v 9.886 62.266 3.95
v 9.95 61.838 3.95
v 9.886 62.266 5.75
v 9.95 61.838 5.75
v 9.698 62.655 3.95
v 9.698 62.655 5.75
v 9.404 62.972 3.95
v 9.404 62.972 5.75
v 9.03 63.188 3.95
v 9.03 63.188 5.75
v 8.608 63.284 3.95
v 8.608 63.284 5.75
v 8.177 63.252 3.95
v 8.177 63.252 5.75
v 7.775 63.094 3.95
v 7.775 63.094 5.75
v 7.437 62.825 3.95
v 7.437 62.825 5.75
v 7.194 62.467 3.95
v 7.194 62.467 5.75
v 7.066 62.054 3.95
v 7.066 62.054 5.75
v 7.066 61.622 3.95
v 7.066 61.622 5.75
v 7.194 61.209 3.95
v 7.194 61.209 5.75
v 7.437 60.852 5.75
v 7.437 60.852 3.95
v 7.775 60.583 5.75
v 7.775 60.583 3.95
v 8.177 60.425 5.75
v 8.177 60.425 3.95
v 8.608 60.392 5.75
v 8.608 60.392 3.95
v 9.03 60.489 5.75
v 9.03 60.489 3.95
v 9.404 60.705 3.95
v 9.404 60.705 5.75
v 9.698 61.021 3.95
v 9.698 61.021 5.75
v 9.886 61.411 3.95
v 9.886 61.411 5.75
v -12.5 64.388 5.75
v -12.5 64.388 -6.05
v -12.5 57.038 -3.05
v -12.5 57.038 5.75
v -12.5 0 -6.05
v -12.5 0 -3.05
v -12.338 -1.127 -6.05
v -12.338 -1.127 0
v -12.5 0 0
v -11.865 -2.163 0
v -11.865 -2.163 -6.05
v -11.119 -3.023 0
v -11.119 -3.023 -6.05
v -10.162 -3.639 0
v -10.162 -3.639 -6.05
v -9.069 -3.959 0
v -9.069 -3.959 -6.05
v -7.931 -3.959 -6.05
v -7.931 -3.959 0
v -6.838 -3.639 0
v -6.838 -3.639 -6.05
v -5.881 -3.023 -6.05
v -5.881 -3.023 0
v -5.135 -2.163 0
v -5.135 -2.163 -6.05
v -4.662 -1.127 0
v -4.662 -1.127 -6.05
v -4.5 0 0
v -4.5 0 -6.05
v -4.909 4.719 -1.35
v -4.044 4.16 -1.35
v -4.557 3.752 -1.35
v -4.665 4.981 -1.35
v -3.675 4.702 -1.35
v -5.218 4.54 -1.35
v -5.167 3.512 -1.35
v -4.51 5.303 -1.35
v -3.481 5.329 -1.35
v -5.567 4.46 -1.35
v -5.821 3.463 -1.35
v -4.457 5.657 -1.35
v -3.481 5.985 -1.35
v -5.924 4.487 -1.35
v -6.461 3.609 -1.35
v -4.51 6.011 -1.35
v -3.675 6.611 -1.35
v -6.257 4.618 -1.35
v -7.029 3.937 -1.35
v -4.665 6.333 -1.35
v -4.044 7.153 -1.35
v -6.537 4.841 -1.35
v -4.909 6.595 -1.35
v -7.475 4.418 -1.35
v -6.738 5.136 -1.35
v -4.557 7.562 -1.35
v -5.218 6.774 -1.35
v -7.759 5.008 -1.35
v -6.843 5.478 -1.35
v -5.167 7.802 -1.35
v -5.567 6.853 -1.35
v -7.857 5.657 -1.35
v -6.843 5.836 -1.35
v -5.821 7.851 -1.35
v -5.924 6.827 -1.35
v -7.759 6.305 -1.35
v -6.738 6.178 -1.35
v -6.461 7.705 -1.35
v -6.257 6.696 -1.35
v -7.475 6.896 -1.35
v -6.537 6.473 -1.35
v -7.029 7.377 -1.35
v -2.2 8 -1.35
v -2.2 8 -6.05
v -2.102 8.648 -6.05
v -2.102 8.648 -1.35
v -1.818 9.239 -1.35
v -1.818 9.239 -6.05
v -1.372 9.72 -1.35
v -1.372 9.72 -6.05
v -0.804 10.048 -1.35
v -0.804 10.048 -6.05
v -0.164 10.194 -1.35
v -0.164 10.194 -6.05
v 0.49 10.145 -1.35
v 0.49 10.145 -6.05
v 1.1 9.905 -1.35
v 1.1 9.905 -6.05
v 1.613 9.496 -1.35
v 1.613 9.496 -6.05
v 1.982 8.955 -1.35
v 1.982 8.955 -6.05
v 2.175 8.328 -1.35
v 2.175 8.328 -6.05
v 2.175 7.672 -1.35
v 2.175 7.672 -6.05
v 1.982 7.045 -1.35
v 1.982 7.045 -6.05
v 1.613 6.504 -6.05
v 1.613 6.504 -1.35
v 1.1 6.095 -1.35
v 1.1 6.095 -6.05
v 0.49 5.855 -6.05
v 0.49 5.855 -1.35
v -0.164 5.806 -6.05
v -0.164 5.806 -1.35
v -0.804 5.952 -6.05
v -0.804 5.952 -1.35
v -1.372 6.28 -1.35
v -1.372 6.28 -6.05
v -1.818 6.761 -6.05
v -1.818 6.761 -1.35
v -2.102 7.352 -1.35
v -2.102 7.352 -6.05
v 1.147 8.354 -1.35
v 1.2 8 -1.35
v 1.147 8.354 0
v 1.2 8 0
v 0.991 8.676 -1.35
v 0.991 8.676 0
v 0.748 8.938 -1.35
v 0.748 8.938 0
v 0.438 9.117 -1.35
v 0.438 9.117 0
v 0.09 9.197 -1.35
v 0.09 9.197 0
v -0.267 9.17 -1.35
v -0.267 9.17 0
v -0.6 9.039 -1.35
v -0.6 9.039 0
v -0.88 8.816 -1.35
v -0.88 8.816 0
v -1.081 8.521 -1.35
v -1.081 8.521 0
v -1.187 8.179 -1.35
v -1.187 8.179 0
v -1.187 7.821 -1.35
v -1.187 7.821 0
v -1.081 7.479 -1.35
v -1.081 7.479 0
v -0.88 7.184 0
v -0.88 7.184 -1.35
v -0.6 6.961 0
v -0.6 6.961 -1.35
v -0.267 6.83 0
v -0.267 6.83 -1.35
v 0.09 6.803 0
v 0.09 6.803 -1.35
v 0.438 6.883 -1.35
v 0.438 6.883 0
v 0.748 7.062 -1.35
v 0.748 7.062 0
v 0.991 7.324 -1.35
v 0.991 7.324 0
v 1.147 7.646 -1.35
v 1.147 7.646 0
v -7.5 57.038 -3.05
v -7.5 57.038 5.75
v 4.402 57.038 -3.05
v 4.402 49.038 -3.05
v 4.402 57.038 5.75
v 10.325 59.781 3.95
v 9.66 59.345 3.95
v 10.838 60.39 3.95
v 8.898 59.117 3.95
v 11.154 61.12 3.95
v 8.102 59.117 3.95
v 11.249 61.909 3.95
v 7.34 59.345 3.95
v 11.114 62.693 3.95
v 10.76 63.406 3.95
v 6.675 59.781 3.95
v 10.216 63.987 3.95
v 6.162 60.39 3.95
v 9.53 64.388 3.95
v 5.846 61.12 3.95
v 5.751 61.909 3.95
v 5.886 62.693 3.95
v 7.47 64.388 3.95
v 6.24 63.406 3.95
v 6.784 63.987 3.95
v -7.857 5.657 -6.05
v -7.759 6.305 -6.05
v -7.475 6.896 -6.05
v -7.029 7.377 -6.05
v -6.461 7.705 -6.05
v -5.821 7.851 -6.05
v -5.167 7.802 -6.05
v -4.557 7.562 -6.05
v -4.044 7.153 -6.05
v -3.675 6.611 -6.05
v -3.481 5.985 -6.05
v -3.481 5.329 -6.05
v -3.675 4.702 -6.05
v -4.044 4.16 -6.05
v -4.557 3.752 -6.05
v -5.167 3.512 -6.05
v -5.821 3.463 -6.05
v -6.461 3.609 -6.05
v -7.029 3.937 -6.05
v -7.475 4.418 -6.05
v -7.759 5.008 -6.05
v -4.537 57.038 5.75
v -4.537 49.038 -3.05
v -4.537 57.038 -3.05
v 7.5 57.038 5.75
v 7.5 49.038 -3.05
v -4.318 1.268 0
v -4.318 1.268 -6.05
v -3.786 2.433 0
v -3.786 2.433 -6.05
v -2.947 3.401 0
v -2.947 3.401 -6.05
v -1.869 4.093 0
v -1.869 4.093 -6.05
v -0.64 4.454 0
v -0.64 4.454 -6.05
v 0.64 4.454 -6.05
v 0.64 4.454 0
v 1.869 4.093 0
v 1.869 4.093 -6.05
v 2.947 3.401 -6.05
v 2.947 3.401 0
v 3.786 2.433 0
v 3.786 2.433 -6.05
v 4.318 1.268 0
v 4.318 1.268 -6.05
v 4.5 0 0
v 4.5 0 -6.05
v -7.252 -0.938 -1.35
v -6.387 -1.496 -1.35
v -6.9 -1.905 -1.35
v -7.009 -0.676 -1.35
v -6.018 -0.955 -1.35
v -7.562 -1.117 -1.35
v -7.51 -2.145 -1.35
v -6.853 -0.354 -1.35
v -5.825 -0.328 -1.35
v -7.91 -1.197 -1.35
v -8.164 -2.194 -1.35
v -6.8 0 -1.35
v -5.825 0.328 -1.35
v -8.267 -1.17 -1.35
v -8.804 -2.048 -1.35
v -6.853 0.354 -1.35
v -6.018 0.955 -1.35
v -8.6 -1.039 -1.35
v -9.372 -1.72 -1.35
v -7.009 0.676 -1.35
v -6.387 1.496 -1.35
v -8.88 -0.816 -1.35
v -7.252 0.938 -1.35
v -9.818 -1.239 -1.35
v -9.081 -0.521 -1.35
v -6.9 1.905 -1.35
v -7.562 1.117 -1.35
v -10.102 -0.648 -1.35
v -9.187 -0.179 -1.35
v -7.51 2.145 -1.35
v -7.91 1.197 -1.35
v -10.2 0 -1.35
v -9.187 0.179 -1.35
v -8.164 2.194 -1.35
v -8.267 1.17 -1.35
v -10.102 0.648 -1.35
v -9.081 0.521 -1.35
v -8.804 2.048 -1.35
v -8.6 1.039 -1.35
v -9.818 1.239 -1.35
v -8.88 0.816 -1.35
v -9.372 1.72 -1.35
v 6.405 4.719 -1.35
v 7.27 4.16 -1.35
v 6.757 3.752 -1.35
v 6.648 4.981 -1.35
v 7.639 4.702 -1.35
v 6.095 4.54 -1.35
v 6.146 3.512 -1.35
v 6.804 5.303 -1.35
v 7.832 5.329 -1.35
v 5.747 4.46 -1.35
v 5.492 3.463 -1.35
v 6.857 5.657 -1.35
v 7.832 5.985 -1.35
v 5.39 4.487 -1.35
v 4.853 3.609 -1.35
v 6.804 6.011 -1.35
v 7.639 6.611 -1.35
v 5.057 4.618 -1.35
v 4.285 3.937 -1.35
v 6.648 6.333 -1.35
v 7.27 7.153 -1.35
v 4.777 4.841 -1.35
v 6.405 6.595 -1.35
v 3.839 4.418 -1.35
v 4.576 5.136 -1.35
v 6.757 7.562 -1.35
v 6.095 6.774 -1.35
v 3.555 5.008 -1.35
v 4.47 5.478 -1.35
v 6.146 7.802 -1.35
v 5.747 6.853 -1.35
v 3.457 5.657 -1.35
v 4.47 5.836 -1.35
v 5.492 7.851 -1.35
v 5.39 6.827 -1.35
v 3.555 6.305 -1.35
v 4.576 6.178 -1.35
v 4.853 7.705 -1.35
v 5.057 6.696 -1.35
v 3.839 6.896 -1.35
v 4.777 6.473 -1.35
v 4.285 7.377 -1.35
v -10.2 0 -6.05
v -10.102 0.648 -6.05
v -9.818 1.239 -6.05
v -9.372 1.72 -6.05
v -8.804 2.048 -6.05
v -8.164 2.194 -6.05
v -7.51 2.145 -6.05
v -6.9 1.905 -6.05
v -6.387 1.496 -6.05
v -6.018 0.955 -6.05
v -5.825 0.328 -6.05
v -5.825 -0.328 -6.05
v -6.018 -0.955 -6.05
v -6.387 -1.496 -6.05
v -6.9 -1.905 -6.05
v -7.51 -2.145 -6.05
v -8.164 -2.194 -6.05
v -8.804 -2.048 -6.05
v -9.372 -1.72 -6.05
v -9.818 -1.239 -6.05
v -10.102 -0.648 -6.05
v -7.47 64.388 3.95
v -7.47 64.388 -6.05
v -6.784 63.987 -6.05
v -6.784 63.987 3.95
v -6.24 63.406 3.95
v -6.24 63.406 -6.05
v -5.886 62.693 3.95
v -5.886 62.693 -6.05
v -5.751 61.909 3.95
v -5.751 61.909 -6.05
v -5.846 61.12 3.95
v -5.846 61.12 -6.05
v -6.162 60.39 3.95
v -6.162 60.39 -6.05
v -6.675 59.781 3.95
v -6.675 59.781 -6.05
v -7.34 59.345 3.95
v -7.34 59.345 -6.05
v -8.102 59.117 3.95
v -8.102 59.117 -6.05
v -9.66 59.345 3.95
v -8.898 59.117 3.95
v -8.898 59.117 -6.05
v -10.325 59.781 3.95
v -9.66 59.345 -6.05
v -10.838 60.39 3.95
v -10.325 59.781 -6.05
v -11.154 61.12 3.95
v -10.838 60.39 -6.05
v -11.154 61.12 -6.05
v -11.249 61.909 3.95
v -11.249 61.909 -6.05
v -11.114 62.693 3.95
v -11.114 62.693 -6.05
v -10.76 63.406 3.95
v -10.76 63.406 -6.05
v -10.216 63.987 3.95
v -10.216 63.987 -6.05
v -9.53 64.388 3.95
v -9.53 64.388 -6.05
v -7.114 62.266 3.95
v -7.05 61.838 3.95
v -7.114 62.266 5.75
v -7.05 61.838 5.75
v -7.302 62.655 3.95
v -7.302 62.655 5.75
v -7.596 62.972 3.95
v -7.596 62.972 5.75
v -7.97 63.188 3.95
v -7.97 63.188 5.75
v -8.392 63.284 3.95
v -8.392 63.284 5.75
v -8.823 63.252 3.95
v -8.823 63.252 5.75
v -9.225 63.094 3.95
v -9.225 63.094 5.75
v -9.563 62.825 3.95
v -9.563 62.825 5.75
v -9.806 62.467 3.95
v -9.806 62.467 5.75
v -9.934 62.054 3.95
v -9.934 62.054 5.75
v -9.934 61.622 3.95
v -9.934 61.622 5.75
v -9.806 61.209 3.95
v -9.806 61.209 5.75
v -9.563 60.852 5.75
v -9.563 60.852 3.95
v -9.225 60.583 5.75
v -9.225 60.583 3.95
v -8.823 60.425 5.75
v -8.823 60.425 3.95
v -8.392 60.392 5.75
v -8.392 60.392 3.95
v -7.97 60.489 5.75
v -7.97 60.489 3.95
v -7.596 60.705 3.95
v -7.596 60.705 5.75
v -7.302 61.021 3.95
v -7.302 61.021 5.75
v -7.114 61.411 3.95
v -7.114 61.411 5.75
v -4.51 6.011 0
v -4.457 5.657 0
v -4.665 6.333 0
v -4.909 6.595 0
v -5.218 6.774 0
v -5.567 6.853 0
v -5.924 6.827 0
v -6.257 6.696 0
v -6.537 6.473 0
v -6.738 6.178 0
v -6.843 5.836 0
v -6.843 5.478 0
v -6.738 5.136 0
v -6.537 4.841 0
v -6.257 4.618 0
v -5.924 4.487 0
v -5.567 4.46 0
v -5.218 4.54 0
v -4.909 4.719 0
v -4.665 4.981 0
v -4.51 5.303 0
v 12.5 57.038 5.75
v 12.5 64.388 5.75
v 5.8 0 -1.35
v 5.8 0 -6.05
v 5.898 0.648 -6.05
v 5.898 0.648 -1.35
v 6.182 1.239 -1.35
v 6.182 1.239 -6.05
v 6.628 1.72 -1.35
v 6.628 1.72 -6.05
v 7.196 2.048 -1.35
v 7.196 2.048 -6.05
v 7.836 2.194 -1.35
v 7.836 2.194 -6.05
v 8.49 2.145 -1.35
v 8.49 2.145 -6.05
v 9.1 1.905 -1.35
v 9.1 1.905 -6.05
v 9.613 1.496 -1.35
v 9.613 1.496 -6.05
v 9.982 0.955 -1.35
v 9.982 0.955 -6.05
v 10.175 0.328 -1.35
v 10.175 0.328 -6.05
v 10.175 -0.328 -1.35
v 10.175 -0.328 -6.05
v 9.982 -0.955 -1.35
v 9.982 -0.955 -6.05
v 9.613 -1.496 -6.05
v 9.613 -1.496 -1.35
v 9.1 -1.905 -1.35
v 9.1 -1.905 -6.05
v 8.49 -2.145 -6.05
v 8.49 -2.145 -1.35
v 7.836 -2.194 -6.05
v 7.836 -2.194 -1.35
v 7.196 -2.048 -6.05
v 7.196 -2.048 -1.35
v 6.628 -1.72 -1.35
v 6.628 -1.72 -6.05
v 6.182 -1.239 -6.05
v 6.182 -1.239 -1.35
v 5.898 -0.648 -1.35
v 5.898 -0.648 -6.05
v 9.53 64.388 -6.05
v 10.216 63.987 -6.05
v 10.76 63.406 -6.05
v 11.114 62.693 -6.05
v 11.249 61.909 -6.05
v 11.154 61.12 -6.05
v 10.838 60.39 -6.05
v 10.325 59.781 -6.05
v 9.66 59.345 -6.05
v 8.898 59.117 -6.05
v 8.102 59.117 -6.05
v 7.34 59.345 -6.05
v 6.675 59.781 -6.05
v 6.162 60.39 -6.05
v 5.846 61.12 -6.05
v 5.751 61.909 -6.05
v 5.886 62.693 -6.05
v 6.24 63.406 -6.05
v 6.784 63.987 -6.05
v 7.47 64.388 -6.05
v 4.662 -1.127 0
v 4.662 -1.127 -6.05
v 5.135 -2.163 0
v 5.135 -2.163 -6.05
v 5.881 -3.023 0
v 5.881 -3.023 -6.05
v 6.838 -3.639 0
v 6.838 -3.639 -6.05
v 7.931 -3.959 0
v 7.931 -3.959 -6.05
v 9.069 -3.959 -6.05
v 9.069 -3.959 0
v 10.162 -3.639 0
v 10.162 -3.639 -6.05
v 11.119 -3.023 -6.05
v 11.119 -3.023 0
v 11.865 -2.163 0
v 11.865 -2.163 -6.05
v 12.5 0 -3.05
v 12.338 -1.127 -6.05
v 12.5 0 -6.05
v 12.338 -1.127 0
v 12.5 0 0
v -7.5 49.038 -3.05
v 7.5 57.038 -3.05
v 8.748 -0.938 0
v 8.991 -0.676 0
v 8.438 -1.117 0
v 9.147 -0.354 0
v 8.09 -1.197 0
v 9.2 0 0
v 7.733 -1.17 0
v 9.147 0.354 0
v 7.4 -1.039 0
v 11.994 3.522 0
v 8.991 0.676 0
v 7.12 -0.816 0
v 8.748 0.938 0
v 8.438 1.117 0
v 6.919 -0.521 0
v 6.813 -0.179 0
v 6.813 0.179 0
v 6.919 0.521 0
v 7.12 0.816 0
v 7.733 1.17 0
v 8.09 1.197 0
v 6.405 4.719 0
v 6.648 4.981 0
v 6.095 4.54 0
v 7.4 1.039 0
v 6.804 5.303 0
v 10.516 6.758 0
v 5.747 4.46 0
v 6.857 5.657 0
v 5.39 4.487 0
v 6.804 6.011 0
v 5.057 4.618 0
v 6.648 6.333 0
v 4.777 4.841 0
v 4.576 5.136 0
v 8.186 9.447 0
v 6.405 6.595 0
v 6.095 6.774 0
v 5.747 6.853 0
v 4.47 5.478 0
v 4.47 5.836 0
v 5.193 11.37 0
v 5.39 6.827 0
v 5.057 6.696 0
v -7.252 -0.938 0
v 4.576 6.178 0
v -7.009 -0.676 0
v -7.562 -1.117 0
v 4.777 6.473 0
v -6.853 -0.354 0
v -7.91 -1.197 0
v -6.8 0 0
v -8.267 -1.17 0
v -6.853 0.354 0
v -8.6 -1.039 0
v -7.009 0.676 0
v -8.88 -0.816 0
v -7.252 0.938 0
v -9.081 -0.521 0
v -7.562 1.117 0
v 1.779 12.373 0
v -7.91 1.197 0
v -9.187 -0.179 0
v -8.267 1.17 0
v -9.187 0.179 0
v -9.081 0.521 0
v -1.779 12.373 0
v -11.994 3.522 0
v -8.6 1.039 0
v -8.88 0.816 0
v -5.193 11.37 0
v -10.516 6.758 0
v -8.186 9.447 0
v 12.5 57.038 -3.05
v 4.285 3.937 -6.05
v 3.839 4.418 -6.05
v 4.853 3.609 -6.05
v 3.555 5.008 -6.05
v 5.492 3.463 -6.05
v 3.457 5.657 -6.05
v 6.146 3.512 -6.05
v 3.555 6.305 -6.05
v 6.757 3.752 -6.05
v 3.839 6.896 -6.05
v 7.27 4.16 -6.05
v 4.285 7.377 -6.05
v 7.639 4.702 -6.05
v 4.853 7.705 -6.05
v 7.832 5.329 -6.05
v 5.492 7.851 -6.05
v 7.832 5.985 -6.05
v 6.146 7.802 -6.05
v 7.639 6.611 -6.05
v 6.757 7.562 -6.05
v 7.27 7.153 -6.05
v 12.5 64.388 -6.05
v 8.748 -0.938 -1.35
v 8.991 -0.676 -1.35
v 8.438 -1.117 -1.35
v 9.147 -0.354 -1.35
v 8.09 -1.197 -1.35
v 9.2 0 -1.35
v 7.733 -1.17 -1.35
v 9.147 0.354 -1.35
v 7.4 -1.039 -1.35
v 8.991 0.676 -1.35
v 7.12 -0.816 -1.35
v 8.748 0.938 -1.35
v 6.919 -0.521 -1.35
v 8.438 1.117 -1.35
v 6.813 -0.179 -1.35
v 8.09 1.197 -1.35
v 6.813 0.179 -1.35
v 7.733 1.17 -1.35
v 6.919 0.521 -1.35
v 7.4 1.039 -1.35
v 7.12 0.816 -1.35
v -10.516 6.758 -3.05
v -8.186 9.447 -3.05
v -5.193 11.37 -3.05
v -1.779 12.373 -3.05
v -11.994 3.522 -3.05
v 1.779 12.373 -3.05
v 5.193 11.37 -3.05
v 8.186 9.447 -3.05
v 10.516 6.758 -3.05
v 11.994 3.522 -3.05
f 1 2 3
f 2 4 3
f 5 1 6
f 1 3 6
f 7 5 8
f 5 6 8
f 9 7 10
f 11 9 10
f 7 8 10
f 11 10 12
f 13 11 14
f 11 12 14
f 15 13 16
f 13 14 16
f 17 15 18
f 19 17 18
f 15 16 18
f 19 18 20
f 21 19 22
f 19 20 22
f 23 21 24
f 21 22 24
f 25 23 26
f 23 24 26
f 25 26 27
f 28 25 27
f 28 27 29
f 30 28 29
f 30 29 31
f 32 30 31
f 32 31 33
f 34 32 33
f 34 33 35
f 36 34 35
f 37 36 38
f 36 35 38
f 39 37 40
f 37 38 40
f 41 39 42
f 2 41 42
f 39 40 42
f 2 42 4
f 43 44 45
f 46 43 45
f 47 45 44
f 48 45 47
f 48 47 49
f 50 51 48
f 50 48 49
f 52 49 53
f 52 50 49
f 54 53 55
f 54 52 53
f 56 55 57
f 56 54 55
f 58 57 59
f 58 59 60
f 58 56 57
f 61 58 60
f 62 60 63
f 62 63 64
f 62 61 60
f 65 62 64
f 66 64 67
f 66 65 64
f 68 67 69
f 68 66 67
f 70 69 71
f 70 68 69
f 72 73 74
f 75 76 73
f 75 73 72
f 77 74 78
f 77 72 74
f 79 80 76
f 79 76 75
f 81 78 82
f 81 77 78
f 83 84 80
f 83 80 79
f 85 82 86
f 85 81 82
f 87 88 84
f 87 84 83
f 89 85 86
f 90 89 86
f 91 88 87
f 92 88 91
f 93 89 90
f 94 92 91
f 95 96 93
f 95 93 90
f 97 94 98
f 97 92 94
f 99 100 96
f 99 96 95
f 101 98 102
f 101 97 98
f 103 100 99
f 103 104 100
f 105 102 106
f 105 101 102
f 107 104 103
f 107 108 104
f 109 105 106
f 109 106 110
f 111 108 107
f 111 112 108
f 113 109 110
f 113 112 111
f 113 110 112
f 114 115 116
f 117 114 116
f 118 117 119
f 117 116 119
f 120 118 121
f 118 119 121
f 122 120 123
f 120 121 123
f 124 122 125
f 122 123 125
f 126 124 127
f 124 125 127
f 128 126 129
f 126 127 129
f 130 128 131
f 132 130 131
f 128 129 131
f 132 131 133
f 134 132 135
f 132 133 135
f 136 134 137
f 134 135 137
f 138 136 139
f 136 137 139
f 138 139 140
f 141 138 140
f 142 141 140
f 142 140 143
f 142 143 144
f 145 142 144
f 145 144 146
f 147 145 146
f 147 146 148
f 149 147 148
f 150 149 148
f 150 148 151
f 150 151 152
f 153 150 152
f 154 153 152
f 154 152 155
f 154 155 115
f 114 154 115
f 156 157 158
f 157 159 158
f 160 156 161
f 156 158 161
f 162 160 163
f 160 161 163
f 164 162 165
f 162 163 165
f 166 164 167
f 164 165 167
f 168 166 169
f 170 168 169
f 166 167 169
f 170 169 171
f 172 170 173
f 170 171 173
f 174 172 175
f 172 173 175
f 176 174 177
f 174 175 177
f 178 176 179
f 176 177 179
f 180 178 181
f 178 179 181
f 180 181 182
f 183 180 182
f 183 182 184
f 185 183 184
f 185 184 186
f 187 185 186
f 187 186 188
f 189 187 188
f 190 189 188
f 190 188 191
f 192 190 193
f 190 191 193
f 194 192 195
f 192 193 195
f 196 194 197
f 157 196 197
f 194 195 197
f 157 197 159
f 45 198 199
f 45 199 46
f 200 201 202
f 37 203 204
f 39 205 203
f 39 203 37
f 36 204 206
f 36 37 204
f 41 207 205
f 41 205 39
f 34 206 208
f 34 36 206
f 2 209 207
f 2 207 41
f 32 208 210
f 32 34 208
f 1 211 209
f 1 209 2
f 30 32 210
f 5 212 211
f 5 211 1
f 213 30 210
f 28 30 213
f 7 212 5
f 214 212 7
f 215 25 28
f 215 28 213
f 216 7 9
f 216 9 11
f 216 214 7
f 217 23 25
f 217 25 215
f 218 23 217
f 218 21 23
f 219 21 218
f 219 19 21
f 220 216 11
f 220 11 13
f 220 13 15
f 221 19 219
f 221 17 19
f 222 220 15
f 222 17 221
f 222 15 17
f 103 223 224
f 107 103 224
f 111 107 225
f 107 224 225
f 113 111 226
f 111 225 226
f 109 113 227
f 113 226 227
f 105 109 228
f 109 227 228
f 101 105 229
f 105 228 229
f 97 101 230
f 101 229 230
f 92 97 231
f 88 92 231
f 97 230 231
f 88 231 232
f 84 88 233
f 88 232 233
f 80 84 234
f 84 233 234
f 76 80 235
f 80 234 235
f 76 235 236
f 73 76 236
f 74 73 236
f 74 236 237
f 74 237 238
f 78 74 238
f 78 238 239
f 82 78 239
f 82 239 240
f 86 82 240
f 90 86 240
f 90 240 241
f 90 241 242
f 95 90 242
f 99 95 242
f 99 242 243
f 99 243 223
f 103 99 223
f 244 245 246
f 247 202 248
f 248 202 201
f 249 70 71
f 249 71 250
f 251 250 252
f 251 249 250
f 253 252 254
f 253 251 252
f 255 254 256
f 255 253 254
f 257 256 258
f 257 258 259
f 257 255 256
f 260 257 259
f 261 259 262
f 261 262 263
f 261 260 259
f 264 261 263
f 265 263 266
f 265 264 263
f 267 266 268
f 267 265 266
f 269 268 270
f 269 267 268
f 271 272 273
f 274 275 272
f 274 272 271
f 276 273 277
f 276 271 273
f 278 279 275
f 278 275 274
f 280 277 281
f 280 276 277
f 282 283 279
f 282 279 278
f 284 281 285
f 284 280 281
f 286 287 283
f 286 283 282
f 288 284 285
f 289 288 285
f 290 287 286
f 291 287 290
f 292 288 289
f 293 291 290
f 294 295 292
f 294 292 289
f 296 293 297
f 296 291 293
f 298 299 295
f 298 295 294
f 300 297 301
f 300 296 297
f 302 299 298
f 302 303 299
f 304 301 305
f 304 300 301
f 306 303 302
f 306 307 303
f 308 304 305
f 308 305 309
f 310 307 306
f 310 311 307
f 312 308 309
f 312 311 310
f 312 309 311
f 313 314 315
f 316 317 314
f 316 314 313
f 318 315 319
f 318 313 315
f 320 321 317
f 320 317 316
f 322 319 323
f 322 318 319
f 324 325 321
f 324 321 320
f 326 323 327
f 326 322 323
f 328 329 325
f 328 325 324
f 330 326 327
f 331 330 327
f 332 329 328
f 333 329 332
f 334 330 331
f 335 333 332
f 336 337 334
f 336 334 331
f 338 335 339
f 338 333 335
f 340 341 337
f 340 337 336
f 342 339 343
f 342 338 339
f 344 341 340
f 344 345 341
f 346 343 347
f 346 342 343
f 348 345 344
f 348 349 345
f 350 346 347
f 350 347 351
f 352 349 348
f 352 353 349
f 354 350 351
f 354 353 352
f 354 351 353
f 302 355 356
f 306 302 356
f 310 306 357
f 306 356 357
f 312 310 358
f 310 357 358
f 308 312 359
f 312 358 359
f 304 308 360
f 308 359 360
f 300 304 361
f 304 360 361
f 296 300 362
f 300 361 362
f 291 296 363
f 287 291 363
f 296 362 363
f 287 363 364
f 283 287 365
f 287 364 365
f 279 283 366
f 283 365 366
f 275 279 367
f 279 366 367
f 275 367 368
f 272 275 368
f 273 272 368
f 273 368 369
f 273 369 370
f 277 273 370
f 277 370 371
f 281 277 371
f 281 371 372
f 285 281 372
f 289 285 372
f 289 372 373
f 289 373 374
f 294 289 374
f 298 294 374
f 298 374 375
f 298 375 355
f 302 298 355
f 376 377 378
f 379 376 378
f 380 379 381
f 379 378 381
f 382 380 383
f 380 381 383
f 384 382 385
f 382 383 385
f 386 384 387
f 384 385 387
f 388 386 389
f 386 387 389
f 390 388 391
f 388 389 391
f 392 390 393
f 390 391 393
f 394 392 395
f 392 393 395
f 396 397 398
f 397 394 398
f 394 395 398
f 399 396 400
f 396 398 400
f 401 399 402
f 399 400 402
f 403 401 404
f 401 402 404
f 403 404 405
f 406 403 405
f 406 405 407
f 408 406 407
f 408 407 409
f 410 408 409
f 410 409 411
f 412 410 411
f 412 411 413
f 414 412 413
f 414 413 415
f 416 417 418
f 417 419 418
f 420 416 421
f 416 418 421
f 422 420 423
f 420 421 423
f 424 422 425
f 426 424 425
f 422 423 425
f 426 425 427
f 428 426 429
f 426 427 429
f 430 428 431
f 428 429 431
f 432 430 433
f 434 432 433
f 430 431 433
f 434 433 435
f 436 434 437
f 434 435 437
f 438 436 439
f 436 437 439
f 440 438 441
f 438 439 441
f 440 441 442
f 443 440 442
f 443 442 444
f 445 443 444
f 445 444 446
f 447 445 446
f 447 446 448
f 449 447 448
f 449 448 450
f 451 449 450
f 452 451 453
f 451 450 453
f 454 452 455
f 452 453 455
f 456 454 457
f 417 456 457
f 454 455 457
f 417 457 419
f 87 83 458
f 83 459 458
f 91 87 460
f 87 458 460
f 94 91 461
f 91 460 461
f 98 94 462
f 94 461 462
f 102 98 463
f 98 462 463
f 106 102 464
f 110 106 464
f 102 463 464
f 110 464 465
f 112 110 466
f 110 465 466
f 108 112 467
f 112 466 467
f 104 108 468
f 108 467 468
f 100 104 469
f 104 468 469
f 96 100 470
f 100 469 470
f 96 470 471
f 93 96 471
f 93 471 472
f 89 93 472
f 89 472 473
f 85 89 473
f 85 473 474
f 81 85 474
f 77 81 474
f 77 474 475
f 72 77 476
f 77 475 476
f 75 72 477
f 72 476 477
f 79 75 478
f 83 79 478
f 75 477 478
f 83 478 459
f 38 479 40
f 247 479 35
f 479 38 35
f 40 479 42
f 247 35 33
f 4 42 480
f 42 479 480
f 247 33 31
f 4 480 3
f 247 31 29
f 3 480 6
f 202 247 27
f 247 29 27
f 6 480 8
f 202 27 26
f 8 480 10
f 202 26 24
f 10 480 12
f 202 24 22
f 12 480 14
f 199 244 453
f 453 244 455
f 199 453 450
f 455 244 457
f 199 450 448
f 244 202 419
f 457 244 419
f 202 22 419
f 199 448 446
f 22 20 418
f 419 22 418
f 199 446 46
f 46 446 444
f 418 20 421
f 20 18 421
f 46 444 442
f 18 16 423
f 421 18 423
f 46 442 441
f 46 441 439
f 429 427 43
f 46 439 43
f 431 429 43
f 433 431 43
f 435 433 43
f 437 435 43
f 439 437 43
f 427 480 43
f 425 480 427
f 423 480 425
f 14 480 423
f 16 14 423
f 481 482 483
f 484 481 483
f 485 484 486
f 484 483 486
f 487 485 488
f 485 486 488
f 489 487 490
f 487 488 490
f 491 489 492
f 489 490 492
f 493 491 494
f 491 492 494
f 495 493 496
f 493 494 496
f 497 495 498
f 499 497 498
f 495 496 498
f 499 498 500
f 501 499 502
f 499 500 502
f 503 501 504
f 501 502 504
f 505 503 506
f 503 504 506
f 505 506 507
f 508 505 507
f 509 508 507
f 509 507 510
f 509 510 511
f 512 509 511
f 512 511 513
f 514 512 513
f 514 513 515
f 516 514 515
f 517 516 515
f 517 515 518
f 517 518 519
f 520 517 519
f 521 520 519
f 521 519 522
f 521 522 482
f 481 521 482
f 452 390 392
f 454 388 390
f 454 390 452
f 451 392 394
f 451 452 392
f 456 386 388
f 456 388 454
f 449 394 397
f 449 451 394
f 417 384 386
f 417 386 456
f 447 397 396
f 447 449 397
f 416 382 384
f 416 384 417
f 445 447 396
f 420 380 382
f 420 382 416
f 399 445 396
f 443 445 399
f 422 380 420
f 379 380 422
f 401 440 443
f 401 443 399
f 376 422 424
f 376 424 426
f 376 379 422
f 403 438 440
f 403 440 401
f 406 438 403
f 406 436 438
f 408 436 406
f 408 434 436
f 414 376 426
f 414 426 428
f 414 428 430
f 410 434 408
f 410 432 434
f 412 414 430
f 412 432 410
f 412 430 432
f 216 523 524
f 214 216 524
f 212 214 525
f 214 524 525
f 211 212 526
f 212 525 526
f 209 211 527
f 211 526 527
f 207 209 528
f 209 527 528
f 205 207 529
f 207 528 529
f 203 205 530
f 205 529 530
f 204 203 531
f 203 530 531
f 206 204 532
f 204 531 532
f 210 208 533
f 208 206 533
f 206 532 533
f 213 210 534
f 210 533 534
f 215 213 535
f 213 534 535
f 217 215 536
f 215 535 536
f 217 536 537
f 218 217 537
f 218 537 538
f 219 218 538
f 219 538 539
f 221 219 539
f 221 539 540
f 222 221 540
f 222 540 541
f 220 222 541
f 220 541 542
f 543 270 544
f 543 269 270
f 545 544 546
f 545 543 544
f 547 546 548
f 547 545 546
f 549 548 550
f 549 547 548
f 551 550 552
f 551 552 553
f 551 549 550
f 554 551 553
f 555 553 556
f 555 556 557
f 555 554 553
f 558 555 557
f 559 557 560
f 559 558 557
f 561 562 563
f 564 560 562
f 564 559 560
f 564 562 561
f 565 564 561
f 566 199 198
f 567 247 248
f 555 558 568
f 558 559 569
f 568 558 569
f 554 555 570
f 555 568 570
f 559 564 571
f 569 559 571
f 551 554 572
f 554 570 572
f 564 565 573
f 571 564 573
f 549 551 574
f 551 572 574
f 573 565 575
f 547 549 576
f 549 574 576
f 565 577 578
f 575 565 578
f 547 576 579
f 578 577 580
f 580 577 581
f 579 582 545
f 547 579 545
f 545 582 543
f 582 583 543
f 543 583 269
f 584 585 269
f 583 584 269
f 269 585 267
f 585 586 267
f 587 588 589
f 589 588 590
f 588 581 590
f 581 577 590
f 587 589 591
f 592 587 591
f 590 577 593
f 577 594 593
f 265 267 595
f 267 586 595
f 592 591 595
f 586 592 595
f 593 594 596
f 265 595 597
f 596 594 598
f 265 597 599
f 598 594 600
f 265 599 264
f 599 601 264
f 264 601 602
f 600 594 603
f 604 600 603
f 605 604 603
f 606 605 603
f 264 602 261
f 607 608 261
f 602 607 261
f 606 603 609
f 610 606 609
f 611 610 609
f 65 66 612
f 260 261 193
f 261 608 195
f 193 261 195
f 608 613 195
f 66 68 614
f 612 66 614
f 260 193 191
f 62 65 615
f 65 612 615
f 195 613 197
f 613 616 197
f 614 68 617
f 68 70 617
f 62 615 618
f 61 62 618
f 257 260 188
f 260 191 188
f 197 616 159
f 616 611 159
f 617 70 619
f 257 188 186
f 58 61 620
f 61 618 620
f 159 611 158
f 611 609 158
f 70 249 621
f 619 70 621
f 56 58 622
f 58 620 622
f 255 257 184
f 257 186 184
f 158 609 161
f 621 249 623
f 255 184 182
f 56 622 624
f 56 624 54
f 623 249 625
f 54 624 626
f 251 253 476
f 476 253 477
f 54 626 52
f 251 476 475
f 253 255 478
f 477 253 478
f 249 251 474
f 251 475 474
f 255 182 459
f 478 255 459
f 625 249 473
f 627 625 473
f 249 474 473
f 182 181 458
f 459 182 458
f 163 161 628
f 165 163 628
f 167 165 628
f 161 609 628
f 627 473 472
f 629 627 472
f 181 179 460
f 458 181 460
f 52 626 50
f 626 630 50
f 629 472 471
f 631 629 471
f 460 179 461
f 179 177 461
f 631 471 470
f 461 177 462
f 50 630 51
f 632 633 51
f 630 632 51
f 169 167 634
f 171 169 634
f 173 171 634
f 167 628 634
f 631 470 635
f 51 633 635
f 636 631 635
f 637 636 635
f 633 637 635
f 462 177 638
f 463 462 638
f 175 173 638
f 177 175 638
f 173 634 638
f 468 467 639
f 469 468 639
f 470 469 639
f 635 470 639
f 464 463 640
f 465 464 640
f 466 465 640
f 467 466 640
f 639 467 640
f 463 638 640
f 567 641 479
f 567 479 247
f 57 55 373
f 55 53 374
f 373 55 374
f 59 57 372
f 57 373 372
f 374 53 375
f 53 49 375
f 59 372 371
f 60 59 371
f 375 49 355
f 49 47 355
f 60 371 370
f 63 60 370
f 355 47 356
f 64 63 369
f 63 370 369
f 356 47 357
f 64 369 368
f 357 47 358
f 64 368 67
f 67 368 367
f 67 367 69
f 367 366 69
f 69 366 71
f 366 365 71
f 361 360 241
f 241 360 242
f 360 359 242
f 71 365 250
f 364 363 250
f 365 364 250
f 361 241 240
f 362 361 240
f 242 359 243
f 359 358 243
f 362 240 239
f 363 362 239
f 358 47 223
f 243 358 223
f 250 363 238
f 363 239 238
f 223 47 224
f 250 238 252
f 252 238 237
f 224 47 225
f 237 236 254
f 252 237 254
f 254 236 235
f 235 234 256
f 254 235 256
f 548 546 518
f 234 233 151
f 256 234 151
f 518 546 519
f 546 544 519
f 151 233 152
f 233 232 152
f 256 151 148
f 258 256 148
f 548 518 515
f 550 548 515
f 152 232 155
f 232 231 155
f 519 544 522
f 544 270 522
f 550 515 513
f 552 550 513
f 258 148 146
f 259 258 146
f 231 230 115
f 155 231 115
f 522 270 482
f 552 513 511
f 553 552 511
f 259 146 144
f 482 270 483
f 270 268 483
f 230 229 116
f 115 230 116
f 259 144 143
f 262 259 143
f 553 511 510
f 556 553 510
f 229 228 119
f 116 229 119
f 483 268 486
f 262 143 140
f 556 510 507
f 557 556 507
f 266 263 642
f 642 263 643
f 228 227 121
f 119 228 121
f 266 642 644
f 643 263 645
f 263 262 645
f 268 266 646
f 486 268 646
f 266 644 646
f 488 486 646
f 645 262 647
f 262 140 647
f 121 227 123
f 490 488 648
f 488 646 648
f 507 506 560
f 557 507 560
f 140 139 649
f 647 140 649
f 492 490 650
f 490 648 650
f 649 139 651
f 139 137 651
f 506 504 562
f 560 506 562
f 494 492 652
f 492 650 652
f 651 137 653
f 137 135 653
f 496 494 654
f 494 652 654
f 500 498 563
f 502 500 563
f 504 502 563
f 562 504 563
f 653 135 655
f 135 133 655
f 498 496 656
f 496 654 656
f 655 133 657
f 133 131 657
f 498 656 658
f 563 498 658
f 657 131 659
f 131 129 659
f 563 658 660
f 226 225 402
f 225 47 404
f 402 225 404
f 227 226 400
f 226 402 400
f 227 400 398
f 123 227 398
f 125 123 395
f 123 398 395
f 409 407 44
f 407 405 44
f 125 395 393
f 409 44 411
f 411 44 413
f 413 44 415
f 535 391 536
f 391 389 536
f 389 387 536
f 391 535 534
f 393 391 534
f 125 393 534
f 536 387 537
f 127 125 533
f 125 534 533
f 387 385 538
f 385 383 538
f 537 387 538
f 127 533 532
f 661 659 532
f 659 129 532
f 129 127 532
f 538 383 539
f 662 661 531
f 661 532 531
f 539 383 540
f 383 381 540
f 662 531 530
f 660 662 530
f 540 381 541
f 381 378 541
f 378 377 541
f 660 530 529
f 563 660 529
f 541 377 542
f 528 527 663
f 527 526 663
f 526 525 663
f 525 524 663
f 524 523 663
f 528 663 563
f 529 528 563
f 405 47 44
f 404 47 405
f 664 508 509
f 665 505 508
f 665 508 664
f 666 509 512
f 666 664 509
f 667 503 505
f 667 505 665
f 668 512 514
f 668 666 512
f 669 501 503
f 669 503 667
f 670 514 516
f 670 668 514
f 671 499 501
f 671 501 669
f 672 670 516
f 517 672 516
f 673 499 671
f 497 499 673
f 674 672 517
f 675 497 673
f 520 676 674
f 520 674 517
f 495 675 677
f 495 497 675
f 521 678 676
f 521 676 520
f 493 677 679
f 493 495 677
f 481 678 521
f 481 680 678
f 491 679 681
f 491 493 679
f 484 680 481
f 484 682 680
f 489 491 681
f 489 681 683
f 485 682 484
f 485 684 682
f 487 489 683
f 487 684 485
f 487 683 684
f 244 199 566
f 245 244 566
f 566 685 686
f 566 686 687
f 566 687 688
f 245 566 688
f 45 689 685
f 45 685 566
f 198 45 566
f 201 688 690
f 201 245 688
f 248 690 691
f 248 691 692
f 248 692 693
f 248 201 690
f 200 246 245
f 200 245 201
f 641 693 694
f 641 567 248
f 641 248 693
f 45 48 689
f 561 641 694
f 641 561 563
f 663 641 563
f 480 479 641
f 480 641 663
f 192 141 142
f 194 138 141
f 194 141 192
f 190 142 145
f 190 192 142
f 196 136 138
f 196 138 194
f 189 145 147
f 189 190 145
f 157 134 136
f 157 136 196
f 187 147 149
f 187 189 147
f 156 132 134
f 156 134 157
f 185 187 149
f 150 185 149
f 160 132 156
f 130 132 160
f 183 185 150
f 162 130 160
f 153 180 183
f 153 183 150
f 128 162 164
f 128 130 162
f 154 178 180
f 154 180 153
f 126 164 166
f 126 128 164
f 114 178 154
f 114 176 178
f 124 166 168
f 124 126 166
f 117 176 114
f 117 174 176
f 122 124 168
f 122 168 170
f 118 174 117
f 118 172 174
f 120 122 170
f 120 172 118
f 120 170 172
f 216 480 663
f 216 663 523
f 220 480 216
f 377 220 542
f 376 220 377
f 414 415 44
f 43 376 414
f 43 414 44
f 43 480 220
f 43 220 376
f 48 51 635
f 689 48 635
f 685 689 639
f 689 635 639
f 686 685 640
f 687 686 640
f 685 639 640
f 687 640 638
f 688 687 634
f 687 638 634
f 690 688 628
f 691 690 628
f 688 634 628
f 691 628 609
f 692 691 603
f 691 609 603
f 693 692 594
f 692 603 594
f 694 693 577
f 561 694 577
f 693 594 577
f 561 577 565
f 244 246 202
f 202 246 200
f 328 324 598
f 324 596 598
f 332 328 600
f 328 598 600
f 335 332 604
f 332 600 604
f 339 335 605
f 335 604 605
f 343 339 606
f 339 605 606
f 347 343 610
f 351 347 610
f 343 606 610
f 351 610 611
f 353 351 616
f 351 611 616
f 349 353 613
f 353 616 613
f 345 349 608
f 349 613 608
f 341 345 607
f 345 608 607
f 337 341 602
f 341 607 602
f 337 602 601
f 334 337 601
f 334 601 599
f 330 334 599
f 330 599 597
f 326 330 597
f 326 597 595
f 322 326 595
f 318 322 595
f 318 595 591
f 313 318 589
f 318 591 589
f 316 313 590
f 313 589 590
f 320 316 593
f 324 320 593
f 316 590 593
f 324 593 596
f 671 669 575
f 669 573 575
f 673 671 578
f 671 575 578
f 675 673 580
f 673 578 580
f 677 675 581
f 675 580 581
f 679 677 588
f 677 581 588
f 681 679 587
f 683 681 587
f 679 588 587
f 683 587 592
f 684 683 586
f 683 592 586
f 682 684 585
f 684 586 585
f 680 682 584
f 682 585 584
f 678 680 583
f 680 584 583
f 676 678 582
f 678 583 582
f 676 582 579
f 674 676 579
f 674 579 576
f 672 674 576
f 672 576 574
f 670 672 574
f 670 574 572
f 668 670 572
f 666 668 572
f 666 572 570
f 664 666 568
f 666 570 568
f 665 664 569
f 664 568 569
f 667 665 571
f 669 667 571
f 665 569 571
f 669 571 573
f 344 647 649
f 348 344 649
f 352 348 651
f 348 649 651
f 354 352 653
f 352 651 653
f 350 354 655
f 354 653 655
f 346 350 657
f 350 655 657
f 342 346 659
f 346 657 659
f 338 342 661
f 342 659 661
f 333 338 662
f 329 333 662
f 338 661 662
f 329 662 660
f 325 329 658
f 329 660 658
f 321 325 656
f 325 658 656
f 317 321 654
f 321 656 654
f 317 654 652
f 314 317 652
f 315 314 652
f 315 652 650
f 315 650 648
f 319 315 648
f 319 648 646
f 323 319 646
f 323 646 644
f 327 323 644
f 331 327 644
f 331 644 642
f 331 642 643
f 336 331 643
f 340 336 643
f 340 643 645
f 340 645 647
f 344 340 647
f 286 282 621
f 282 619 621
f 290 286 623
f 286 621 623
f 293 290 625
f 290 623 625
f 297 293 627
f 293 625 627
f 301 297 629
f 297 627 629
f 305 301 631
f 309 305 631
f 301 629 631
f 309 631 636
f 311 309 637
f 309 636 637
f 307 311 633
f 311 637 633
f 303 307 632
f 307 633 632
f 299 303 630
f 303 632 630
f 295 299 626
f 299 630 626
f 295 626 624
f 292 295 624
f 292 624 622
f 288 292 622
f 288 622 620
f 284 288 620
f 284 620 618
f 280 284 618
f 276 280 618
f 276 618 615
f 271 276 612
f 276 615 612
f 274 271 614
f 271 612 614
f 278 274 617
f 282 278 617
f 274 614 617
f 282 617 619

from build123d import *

# Parameters (mm, degrees)
RESSALTO_EXTRUS_O1_DEPTH            = 3.05
RESSALTO_EXTRUS_O2_DEPTH            = 3
ESBO_O4_W                           = 25
ESBO_O4_H                           = 7.35
RESSALTO_EXTRUS_O3_DEPTH            = 11.8
REBAIXO_PARA_SHCS_M2_51_D           = 2.9
REBAIXO_PARA_SHCS_M2_51_CBORE_D     = 5.5
REBAIXO_PARA_SHCS_M2_51_CBORE_DEPTH = 10
REBAIXO_PARA_SHCS_M21_D             = 2.4
REBAIXO_PARA_SHCS_M21_CBORE_D       = 4.4
REBAIXO_PARA_SHCS_M21_CBORE_DEPTH   = 4.7
NERVURA1_REACH                      = 67.869
ESBO_O5_WALL_W                      = 145.630512272
ESBO_O5_WALL_H                      = 15
CORTE_EXTRUS_O1_REACH               = 68.178
ESBO_O6_W                           = 8.93885445
ESBO_O6_H                           = 8


with BuildPart() as part:
    # Esboço1 → Ressalto-extrusão1 (new body)
    with BuildSketch(Plane.XY):
        with BuildLine():
            ThreePointArc((4.5, 0), (0, 4.5), (-4.5, 0))
            ThreePointArc((-4.5, 0), (-8.5, -4), (-12.5, 0))
            ThreePointArc((-12.5, 0), (0, 12.5), (12.5, 0))
            ThreePointArc((12.5, 0), (8.5, -4), (4.5, 0))
        make_face()
    extrude(amount=-RESSALTO_EXTRUS_O1_DEPTH)

    # Esboço2 → Ressalto-extrusão2 (add)
    with BuildSketch(Plane(origin=(0, 0, -3.05), x_dir=(-1, 0, 0), z_dir=(0, 0, -1))):
        with BuildLine():
            Line((-12.5, 64.388275999), (12.5, 64.388275999))
            Line((12.5, 64.388275999), (12.5, 0))
            ThreePointArc((12.5, 0), (8.5, -4), (4.5, 0))
            ThreePointArc((4.5, 0), (0, 4.5), (-4.5, 0))
            ThreePointArc((-4.5, 0), (-8.5, -4), (-12.5, 0))
            Line((-12.5, 0), (-12.5, 64.388275999))
        make_face()
    extrude(amount=RESSALTO_EXTRUS_O2_DEPTH)

    # Esboço4 → Ressalto-extrusão3 (add)
    with BuildSketch(Plane(origin=(0, 0, -6.05), x_dir=(-1, 0, 0), z_dir=(0, 0, -1))):
        with Locations((0, 60.713275999)):
            Rectangle(ESBO_O4_W, ESBO_O4_H)
    extrude(amount=-RESSALTO_EXTRUS_O3_DEPTH)

    # Rebaixo para SHCS M2.51 (through all)
    with Locations(Plane(origin=(0, 0, -6.05), x_dir=(-1, 0, 0), z_dir=(0, 0, -1))):
        with Locations((-8.5, 61.838275999), (8.5, 61.838275999)):
            CounterBoreHole(REBAIXO_PARA_SHCS_M2_51_D / 2, REBAIXO_PARA_SHCS_M2_51_CBORE_D / 2, REBAIXO_PARA_SHCS_M2_51_CBORE_DEPTH)

    # Rebaixo para SHCS M21 (through all)
    with Locations(Plane(origin=(0, 0, -6.05), x_dir=(-1, 0, 0), z_dir=(0, 0, -1))):
        with Locations((-8, 0), (-5.656854249, 5.656854249), (0, 8), (5.656854249, 5.656854249), (8, 0)):
            CounterBoreHole(REBAIXO_PARA_SHCS_M21_D / 2, REBAIXO_PARA_SHCS_M21_CBORE_D / 2, REBAIXO_PARA_SHCS_M21_CBORE_DEPTH)

    # Esboço5 wall → Nervura1 (add, up to next)
    with BuildSketch(Plane(origin=(0, 53.038275999, 1.35), x_dir=(0, -0.672672793996, -0.739940073396), z_dir=(0, 0.739940073396, -0.672672793996)), mode=Mode.PRIVATE) as nervura1_sk1:
        Rectangle(ESBO_O5_WALL_W, ESBO_O5_WALL_H)
    nervura1_tool1 = extrude(nervura1_sk1.sketch, amount=NERVURA1_REACH, mode=Mode.PRIVATE) - part.part
    add(nervura1_tool1.solids().sort_by_distance((0, 53.038275999, 1.35))[0])

    # Esboço6 → Corte-extrusão1 (cut, up to next)
    with BuildSketch(Plane.XY.offset(-3.05), mode=Mode.PRIVATE) as corte_extrus_o1_sk1:
        with Locations((-0.067802218, 53.038275999)):
            Rectangle(ESBO_O6_W, ESBO_O6_H)
    corte_extrus_o1_tool1 = extrude(corte_extrus_o1_sk1.sketch, amount=CORTE_EXTRUS_O1_REACH, mode=Mode.PRIVATE) & part.part
    add(corte_extrus_o1_tool1.solids().sort_by_distance((-0.067802, 53.038276, -3.05))[0], mode=Mode.SUBTRACT)


solid = part.part
